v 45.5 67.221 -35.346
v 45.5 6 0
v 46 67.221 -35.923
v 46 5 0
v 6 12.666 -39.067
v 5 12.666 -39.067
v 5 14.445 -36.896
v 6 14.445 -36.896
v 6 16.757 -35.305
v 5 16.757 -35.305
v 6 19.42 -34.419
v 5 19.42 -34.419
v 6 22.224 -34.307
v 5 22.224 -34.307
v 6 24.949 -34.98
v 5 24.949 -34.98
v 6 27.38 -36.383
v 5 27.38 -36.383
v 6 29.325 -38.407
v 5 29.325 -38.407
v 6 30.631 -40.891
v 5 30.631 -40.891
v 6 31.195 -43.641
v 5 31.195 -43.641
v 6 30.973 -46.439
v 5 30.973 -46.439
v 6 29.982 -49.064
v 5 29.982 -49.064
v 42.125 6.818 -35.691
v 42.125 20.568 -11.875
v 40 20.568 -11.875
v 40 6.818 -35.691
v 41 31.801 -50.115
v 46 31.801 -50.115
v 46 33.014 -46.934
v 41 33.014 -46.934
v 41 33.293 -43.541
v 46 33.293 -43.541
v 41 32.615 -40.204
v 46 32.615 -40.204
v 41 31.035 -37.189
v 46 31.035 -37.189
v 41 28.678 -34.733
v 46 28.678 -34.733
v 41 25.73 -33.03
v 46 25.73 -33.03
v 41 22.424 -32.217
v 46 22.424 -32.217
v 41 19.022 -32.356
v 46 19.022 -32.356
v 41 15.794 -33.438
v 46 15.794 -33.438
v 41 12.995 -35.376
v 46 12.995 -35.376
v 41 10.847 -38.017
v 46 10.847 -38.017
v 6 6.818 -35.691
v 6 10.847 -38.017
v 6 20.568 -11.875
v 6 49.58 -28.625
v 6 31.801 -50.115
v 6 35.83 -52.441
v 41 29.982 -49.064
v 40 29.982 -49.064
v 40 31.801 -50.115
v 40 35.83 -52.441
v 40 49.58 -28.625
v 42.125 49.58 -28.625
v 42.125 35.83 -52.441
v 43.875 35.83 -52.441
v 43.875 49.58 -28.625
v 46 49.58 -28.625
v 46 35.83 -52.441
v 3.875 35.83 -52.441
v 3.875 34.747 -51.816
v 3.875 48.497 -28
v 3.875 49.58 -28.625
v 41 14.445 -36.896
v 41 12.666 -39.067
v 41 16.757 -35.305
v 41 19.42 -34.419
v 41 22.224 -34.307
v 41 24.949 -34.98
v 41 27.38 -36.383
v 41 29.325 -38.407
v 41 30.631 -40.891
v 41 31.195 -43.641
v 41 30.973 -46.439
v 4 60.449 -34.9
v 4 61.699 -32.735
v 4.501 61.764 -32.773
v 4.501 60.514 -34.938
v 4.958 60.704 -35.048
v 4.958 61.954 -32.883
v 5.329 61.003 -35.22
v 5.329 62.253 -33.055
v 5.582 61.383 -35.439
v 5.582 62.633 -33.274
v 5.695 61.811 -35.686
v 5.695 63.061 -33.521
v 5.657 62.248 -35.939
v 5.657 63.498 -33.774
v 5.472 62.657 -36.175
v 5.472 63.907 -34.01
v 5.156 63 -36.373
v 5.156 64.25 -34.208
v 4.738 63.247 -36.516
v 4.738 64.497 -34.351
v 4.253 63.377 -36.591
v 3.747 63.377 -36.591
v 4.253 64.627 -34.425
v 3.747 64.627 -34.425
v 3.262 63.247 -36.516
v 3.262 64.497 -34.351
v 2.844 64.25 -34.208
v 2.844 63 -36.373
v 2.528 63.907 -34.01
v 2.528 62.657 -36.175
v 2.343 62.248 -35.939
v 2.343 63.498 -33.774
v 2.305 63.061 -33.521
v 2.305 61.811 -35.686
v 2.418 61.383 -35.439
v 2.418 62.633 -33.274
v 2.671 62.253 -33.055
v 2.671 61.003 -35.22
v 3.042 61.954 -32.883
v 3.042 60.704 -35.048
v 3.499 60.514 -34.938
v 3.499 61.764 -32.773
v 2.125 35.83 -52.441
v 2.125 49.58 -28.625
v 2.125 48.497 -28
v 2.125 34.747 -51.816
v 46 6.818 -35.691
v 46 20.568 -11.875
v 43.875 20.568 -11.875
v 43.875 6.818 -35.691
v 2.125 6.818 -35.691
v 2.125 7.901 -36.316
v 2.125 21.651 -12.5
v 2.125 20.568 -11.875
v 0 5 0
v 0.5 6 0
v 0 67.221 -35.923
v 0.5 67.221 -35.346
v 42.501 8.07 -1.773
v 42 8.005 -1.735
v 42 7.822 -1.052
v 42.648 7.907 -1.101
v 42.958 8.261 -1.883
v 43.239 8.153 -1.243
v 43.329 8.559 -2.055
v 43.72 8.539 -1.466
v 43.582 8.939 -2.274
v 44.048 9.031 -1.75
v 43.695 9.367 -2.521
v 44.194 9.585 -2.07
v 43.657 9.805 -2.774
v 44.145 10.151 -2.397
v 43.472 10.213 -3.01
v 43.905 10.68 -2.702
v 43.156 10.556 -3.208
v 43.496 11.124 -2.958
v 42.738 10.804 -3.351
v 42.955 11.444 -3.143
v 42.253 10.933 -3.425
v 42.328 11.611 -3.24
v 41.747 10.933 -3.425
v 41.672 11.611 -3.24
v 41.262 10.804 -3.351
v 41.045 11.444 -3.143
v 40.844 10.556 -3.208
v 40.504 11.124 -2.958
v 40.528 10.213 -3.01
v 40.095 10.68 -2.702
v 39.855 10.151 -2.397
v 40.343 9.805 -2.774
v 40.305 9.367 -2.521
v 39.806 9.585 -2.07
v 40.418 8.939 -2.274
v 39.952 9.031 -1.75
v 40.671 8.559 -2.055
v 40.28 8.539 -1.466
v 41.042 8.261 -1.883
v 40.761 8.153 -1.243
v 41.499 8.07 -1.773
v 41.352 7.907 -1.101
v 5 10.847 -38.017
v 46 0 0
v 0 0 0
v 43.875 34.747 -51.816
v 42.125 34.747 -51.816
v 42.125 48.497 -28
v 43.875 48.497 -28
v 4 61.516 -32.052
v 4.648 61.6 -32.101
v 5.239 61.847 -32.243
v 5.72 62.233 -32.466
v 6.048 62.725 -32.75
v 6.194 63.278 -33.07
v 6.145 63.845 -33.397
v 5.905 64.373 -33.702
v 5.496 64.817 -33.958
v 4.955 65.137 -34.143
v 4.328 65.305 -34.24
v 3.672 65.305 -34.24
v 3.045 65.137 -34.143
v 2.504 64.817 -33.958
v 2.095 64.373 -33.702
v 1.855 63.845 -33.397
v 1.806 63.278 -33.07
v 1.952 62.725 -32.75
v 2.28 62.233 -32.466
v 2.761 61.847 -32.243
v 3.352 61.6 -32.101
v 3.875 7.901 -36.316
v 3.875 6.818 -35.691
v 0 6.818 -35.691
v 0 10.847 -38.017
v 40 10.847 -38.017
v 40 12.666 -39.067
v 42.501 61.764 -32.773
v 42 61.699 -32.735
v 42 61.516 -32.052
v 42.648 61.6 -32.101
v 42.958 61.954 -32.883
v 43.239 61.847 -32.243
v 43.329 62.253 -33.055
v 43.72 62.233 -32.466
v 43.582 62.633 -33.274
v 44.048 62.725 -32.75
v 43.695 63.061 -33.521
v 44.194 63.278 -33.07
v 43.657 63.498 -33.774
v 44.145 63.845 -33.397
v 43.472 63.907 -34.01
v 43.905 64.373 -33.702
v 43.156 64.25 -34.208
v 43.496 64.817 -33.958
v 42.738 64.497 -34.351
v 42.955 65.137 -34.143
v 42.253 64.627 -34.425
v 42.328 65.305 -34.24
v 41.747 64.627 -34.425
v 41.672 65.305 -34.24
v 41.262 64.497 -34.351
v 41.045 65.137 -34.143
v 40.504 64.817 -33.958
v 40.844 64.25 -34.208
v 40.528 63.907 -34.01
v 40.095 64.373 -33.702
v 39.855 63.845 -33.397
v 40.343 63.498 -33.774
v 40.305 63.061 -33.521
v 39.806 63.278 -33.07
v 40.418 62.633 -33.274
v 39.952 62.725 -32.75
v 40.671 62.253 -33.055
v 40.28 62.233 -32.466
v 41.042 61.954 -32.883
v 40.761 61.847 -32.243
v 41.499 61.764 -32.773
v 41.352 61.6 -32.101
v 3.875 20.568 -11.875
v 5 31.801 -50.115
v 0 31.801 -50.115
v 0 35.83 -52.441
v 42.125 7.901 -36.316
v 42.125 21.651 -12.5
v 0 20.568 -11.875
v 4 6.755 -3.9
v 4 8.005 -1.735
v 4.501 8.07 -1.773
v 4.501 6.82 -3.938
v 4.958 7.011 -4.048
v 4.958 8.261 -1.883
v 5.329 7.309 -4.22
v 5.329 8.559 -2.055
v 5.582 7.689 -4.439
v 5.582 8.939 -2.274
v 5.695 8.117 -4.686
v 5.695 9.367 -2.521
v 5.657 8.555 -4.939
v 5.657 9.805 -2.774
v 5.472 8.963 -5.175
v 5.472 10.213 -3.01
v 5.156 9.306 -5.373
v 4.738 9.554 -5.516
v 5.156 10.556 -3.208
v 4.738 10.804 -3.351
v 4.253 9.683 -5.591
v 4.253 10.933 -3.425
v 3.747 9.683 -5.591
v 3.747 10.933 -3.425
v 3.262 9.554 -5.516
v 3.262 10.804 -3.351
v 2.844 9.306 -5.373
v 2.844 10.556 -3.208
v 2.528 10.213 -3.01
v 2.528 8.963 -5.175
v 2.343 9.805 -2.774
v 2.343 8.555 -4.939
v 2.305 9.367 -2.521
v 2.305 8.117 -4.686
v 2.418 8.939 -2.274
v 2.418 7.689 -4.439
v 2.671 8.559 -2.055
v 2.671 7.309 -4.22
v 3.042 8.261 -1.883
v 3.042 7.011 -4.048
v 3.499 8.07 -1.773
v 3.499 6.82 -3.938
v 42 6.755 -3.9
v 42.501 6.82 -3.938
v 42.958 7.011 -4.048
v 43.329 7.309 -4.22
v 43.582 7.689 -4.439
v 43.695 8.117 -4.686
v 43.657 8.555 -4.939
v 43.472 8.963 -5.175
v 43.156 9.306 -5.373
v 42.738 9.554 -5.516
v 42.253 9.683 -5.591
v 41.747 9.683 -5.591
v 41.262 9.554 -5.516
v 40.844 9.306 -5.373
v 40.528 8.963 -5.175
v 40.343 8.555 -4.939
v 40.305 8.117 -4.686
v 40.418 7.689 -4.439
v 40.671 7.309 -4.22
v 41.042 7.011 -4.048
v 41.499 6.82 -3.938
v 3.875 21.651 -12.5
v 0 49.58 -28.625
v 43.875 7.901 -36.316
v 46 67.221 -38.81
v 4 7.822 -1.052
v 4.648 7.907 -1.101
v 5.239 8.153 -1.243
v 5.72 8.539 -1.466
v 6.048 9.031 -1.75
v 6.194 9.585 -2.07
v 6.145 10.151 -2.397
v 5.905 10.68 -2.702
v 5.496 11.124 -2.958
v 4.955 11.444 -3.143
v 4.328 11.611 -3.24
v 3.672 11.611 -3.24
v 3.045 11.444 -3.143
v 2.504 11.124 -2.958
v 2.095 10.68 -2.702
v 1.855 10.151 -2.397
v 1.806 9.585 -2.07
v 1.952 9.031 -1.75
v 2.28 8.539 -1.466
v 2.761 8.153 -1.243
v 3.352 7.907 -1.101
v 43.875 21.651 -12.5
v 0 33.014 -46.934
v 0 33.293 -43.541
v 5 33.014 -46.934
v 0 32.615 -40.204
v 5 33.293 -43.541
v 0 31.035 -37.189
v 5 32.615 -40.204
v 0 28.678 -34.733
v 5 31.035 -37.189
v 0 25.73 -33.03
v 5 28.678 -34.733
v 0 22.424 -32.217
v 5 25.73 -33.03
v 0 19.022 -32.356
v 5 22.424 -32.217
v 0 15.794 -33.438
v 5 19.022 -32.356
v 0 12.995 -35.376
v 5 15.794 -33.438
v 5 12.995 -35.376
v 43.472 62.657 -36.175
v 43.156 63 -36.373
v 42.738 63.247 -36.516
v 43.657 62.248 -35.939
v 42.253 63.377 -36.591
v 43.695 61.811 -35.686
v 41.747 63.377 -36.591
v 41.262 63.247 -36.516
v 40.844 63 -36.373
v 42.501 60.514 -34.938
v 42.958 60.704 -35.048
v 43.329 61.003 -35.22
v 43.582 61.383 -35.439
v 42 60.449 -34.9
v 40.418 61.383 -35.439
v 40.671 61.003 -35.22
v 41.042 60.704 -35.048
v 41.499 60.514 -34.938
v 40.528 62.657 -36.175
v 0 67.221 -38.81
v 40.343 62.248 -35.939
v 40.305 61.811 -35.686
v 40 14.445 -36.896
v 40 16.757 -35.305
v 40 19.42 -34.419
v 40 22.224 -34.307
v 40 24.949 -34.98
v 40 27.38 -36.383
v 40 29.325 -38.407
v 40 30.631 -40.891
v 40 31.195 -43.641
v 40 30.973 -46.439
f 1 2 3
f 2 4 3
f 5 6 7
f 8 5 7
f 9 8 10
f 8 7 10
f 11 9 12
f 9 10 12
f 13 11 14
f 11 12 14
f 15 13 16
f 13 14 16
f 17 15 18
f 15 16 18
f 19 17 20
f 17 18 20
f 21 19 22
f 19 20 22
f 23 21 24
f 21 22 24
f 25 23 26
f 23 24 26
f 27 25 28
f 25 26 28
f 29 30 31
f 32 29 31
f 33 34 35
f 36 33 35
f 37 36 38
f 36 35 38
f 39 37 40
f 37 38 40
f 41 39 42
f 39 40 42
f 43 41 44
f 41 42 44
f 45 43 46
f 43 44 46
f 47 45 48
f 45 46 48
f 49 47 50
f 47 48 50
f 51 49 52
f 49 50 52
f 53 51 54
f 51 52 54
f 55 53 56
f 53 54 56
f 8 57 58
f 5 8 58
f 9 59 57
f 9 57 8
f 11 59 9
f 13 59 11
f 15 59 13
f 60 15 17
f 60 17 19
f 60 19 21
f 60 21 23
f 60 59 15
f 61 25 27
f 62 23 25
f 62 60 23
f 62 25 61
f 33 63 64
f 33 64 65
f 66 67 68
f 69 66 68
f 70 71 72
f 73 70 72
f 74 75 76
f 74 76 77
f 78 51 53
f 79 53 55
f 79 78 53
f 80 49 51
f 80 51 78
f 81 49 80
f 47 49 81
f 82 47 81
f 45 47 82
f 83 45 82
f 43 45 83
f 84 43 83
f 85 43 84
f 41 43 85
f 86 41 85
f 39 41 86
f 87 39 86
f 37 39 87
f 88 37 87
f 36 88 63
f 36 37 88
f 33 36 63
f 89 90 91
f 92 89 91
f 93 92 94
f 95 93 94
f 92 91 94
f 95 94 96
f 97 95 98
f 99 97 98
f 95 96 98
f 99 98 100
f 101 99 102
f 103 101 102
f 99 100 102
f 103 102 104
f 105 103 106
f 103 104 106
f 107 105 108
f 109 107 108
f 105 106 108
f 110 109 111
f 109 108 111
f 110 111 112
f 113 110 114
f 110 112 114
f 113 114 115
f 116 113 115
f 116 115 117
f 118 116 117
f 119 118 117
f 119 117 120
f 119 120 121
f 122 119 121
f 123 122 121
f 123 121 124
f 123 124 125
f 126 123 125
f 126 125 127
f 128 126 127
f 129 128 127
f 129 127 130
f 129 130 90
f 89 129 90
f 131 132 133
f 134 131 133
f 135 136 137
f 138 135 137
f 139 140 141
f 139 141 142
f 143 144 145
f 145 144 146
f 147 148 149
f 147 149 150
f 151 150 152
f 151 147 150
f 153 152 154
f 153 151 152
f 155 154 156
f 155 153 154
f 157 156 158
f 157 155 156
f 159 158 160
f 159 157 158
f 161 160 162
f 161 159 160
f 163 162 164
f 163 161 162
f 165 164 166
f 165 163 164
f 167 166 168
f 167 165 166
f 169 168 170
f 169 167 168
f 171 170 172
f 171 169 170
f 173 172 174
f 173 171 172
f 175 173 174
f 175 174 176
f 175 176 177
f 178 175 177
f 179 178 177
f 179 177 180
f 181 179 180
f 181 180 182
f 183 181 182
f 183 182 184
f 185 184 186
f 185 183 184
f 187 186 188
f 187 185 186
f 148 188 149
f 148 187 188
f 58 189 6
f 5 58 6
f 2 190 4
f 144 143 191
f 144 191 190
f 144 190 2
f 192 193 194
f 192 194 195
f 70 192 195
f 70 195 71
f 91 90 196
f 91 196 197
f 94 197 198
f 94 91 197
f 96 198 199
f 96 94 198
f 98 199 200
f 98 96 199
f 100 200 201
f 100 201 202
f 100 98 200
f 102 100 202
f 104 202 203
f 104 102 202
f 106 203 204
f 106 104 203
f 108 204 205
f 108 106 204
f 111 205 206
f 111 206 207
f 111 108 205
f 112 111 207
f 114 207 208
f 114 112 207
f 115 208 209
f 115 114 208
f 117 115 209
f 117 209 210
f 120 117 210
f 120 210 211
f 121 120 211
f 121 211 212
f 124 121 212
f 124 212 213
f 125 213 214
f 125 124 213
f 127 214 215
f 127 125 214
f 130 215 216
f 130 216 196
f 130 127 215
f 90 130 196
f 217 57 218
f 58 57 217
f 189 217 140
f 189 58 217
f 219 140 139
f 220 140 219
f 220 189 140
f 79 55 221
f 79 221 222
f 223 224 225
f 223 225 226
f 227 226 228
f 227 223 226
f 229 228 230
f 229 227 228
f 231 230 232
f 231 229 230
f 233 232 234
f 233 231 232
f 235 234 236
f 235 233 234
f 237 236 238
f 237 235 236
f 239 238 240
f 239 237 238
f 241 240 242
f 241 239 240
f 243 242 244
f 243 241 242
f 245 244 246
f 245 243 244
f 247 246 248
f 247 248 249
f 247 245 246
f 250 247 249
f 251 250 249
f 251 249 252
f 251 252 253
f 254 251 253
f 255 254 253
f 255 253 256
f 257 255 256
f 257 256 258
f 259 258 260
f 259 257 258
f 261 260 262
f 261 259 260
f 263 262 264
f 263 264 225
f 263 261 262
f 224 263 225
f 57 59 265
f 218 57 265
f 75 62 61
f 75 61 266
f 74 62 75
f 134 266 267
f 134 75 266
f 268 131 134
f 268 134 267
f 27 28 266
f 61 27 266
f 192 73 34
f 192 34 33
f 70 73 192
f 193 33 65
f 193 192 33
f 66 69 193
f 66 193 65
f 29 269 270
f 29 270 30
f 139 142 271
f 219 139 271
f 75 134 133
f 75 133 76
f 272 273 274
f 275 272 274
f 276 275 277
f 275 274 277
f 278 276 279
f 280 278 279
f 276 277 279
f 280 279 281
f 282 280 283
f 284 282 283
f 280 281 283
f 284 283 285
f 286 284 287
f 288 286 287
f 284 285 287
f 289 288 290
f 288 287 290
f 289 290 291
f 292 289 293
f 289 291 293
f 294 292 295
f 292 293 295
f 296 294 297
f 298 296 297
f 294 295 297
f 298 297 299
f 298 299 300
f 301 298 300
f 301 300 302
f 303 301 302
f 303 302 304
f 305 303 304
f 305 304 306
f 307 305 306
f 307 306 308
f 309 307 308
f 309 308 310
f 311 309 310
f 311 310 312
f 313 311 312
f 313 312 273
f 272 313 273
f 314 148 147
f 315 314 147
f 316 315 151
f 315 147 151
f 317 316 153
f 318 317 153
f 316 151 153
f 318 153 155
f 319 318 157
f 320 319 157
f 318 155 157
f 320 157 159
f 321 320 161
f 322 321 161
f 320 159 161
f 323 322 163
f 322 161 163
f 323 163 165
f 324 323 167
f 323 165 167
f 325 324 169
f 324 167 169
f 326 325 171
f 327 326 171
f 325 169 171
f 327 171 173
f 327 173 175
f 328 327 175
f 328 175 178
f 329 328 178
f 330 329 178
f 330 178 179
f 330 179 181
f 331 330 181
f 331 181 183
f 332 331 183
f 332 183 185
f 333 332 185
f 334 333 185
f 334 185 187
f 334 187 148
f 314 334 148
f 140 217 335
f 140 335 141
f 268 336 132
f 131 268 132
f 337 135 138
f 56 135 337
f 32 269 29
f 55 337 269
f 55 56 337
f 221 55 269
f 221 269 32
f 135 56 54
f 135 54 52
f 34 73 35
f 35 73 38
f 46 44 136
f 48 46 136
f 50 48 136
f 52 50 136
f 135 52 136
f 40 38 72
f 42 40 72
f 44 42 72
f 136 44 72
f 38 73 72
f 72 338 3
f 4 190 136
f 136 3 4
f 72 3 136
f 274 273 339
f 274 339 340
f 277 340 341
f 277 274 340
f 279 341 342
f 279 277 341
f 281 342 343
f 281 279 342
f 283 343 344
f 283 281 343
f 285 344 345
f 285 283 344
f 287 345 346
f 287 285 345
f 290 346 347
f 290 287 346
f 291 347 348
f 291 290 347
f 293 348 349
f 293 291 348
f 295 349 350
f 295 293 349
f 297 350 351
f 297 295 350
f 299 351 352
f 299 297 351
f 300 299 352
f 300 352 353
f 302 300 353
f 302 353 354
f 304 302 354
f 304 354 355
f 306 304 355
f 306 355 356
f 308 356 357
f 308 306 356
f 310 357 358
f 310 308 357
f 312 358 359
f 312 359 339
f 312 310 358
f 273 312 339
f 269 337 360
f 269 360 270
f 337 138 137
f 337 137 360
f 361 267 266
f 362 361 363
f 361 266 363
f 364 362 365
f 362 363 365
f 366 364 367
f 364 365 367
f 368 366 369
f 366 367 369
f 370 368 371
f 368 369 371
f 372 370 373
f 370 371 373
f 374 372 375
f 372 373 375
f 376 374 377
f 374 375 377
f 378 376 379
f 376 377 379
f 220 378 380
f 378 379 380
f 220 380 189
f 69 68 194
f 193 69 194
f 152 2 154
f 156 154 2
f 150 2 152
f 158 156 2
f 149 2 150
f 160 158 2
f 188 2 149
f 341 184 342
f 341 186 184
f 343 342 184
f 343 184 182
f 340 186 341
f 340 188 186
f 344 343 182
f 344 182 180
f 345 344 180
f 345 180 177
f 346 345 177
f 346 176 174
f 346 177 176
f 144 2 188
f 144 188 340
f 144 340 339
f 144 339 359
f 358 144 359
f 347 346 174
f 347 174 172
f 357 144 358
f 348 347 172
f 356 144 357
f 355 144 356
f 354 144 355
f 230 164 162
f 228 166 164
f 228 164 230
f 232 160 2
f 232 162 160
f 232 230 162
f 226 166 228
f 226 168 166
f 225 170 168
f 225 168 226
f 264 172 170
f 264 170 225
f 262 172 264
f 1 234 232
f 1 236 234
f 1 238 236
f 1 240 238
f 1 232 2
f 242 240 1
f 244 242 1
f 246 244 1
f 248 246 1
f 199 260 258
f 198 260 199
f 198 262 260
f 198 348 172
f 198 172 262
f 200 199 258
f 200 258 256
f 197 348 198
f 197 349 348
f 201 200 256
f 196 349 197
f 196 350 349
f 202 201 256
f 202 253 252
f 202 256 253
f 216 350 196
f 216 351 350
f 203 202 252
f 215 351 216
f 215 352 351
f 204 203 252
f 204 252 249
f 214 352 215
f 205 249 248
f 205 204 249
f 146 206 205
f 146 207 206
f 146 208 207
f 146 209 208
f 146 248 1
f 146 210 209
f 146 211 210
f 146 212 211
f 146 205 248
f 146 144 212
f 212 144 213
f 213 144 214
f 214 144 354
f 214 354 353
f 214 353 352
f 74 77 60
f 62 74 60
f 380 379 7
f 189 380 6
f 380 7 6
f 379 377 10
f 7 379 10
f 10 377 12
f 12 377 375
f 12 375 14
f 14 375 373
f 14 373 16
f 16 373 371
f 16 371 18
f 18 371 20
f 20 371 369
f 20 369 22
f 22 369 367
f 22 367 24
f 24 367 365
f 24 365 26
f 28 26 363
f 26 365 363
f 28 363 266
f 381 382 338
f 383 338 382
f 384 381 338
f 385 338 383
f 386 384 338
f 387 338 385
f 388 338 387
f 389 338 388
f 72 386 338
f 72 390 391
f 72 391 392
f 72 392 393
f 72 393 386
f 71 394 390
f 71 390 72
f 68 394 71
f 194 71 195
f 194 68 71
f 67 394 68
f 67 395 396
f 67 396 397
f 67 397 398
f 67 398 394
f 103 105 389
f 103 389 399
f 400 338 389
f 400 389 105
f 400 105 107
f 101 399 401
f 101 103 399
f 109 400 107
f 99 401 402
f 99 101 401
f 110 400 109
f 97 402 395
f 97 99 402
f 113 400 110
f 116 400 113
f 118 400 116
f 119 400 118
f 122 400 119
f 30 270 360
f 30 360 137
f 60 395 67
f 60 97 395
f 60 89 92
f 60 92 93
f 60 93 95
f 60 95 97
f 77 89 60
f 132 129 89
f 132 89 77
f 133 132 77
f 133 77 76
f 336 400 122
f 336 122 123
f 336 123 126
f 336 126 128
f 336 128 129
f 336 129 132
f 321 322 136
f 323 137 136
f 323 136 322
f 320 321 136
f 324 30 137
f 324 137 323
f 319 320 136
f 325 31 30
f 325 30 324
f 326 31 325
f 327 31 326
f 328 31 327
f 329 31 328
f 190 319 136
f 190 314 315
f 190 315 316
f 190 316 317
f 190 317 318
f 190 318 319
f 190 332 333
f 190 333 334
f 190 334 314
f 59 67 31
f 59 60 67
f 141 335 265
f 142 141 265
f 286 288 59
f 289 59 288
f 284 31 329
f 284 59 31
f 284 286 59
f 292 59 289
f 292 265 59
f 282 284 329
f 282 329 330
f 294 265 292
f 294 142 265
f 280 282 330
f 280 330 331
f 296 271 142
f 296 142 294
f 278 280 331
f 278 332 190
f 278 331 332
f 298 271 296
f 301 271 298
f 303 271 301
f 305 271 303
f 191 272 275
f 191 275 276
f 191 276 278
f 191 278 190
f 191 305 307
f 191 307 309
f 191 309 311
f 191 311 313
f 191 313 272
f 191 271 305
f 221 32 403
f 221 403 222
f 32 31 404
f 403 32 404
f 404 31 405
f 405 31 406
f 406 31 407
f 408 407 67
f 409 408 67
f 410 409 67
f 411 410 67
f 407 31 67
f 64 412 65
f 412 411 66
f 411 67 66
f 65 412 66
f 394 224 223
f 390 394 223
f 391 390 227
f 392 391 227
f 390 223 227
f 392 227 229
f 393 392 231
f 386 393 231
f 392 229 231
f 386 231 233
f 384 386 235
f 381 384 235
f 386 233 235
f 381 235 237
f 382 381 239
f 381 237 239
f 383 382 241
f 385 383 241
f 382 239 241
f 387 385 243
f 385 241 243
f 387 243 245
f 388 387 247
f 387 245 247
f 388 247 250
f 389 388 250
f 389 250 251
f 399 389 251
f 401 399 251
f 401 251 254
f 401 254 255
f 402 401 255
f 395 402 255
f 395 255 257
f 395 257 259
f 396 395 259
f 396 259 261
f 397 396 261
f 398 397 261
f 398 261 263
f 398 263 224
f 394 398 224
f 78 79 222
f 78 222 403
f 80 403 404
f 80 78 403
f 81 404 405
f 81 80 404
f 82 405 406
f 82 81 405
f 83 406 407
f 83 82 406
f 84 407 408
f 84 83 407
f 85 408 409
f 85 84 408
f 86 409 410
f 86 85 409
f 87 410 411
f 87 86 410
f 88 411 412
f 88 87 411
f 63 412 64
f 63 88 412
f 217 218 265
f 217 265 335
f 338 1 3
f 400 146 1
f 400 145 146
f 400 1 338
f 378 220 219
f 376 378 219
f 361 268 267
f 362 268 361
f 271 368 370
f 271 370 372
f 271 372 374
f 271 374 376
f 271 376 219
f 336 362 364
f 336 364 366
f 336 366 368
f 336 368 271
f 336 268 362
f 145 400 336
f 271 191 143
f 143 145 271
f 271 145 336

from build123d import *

# Parameters (mm, degrees)
BOSS_EXTRUDE1_DEPTH = 46
SKETCH2_R           = 1.7
CUT_EXTRUDE1_DEPTH  = 46
BOSS_EXTRUDE3_DEPTH = 27.5
SKETCH8_R           = 12.1
CUT_EXTRUDE2_DEPTH  = 63.75
BOSS_EXTRUDE4_START = -5
BOSS_EXTRUDE4_DEPTH = 1
BOSS_EXTRUDE5_START = -41
BOSS_EXTRUDE5_DEPTH = 1
CHAMFER1_SIZE       = 0.5


# Read off the part's stored shape, not the designer's step: Boss-Extrude5
with BuildPart() as part:
    # Sketch1 → Boss-Extrude1 (new body)
    with BuildSketch(Plane(origin=(0, 0, 0), x_dir=(0, 0, -1), z_dir=(1, 0, 0))):
        Polygon((0, 0), (0, 6), (35.345898385, 67.220891842), (38.81, 67.220891842), align=None)
    extrude(amount=BOSS_EXTRUDE1_DEPTH)

    # Sketch2 → Cut-Extrude1 (cut)
    with BuildSketch(Plane(origin=(0, 1.5, 2.598076211), x_dir=(1, 0, 0), z_dir=(0, 0.4999999999999947, 0.8660254037844417))):
        with Locations(Location((4, 9.5, 0), (0, 0, 270))):
            Circle(SKETCH2_R)
        with Locations(Location((42, 9.5, 0), (0, 0, 270))):
            Circle(SKETCH2_R)
        with Locations(Location((42, 71.5, 0), (0, 0, 270))):
            Circle(SKETCH2_R)
        with Locations(Location((4, 71.5, 0), (0, 0, 270))):
            Circle(SKETCH2_R)
    extrude(amount=-CUT_EXTRUDE1_DEPTH, mode=Mode.SUBTRACT)

    # Sketch7 → Boss-Extrude3 (add)
    with BuildSketch(Plane(origin=(0, 0, 0), x_dir=(-1, 0, 0), z_dir=(0, -0.49999999999999495, -0.8660254037844417))):
        Polygon((-42.125, 23.75), (-40, 23.75), (-40, 57.25), (-42.125, 57.25), (-42.125, 56), (-43.875, 56), (-43.875, 57.25), (-46, 57.25), (-46, 23.75), (-43.875, 23.75), (-43.875, 25), (-42.125, 25), align=None)
        Polygon((-6, 57.25), (-6, 23.75), (-3.875, 23.75), (-3.875, 25), (-2.125, 25), (-2.125, 23.75), (0, 23.75), (0, 57.25), (-2.125, 57.25), (-2.125, 56), (-3.875, 56), (-3.875, 57.25), align=None)
    extrude(amount=BOSS_EXTRUDE3_DEPTH)

    # Sketch8 → Cut-Extrude2 (cut)
    with BuildSketch(Plane(origin=(46, 0, 0), x_dir=(0, 0, -1), z_dir=(1, 0, 0))):
        with Locations((44.256224193, 21.214028853)):
            Circle(SKETCH8_R)
    extrude(amount=-CUT_EXTRUDE2_DEPTH, mode=Mode.SUBTRACT)

    # Sketch9 → Boss-Extrude4 (add)
    with BuildSketch(Plane(origin=(46, 0, 0), x_dir=(0, 0, -1), z_dir=(1, 0, 0)).offset(BOSS_EXTRUDE4_START)):
        with BuildLine():
            ThreePointArc((50.114698521, 31.801204045), (33.777316807, 27.264028853), (38.016698687, 10.846853661))
            Line((38.016698687, 10.846853661), (39.066908751, 12.665870851))
            ThreePointArc((39.066908751, 12.665870851), (35.595970155, 26.214028853), (49.064488458, 29.982186856))
            Line((49.064488458, 29.982186856), (50.114698521, 31.801204045))
        make_face()
    extrude(amount=-BOSS_EXTRUDE4_DEPTH)

    # Boss-Extrude5 outline → Boss-Extrude5 (add)
    with BuildSketch(Plane(origin=(46, 0, 0), x_dir=(0, 0, -1), z_dir=(1, 0, 0)).offset(BOSS_EXTRUDE5_START)):
        with BuildLine():
            ThreePointArc((39.066908751, 12.665870851), (35.595970155, 26.214028854), (49.064488458, 29.982186856))
            Line((49.064488458, 29.982186856), (50.114698521, 31.801204045))
            ThreePointArc((50.114698521, 31.801204045), (33.777316807, 27.264028853), (38.016698687, 10.846853661))
            Line((38.016698687, 10.846853661), (39.066908751, 12.665870851))
        make_face()
    extrude(amount=BOSS_EXTRUDE5_DEPTH)

    # Chamfer1
    chamfer1_edges = [part.edges().sort_by_distance(p)[0] for p in [
        (46, 36.610445921, -17.672949192),
        (4, 64.893059557, -34.001923789),
        (42, 64.893059557, -34.001923789),
        (42, 11.199484522, -3.001923789),
        (4, 11.199484522, -3.001923789),
        (0, 36.610445921, -17.672949192),
    ]]
    chamfer(chamfer1_edges, length=CHAMFER1_SIZE)


solid = part.part
